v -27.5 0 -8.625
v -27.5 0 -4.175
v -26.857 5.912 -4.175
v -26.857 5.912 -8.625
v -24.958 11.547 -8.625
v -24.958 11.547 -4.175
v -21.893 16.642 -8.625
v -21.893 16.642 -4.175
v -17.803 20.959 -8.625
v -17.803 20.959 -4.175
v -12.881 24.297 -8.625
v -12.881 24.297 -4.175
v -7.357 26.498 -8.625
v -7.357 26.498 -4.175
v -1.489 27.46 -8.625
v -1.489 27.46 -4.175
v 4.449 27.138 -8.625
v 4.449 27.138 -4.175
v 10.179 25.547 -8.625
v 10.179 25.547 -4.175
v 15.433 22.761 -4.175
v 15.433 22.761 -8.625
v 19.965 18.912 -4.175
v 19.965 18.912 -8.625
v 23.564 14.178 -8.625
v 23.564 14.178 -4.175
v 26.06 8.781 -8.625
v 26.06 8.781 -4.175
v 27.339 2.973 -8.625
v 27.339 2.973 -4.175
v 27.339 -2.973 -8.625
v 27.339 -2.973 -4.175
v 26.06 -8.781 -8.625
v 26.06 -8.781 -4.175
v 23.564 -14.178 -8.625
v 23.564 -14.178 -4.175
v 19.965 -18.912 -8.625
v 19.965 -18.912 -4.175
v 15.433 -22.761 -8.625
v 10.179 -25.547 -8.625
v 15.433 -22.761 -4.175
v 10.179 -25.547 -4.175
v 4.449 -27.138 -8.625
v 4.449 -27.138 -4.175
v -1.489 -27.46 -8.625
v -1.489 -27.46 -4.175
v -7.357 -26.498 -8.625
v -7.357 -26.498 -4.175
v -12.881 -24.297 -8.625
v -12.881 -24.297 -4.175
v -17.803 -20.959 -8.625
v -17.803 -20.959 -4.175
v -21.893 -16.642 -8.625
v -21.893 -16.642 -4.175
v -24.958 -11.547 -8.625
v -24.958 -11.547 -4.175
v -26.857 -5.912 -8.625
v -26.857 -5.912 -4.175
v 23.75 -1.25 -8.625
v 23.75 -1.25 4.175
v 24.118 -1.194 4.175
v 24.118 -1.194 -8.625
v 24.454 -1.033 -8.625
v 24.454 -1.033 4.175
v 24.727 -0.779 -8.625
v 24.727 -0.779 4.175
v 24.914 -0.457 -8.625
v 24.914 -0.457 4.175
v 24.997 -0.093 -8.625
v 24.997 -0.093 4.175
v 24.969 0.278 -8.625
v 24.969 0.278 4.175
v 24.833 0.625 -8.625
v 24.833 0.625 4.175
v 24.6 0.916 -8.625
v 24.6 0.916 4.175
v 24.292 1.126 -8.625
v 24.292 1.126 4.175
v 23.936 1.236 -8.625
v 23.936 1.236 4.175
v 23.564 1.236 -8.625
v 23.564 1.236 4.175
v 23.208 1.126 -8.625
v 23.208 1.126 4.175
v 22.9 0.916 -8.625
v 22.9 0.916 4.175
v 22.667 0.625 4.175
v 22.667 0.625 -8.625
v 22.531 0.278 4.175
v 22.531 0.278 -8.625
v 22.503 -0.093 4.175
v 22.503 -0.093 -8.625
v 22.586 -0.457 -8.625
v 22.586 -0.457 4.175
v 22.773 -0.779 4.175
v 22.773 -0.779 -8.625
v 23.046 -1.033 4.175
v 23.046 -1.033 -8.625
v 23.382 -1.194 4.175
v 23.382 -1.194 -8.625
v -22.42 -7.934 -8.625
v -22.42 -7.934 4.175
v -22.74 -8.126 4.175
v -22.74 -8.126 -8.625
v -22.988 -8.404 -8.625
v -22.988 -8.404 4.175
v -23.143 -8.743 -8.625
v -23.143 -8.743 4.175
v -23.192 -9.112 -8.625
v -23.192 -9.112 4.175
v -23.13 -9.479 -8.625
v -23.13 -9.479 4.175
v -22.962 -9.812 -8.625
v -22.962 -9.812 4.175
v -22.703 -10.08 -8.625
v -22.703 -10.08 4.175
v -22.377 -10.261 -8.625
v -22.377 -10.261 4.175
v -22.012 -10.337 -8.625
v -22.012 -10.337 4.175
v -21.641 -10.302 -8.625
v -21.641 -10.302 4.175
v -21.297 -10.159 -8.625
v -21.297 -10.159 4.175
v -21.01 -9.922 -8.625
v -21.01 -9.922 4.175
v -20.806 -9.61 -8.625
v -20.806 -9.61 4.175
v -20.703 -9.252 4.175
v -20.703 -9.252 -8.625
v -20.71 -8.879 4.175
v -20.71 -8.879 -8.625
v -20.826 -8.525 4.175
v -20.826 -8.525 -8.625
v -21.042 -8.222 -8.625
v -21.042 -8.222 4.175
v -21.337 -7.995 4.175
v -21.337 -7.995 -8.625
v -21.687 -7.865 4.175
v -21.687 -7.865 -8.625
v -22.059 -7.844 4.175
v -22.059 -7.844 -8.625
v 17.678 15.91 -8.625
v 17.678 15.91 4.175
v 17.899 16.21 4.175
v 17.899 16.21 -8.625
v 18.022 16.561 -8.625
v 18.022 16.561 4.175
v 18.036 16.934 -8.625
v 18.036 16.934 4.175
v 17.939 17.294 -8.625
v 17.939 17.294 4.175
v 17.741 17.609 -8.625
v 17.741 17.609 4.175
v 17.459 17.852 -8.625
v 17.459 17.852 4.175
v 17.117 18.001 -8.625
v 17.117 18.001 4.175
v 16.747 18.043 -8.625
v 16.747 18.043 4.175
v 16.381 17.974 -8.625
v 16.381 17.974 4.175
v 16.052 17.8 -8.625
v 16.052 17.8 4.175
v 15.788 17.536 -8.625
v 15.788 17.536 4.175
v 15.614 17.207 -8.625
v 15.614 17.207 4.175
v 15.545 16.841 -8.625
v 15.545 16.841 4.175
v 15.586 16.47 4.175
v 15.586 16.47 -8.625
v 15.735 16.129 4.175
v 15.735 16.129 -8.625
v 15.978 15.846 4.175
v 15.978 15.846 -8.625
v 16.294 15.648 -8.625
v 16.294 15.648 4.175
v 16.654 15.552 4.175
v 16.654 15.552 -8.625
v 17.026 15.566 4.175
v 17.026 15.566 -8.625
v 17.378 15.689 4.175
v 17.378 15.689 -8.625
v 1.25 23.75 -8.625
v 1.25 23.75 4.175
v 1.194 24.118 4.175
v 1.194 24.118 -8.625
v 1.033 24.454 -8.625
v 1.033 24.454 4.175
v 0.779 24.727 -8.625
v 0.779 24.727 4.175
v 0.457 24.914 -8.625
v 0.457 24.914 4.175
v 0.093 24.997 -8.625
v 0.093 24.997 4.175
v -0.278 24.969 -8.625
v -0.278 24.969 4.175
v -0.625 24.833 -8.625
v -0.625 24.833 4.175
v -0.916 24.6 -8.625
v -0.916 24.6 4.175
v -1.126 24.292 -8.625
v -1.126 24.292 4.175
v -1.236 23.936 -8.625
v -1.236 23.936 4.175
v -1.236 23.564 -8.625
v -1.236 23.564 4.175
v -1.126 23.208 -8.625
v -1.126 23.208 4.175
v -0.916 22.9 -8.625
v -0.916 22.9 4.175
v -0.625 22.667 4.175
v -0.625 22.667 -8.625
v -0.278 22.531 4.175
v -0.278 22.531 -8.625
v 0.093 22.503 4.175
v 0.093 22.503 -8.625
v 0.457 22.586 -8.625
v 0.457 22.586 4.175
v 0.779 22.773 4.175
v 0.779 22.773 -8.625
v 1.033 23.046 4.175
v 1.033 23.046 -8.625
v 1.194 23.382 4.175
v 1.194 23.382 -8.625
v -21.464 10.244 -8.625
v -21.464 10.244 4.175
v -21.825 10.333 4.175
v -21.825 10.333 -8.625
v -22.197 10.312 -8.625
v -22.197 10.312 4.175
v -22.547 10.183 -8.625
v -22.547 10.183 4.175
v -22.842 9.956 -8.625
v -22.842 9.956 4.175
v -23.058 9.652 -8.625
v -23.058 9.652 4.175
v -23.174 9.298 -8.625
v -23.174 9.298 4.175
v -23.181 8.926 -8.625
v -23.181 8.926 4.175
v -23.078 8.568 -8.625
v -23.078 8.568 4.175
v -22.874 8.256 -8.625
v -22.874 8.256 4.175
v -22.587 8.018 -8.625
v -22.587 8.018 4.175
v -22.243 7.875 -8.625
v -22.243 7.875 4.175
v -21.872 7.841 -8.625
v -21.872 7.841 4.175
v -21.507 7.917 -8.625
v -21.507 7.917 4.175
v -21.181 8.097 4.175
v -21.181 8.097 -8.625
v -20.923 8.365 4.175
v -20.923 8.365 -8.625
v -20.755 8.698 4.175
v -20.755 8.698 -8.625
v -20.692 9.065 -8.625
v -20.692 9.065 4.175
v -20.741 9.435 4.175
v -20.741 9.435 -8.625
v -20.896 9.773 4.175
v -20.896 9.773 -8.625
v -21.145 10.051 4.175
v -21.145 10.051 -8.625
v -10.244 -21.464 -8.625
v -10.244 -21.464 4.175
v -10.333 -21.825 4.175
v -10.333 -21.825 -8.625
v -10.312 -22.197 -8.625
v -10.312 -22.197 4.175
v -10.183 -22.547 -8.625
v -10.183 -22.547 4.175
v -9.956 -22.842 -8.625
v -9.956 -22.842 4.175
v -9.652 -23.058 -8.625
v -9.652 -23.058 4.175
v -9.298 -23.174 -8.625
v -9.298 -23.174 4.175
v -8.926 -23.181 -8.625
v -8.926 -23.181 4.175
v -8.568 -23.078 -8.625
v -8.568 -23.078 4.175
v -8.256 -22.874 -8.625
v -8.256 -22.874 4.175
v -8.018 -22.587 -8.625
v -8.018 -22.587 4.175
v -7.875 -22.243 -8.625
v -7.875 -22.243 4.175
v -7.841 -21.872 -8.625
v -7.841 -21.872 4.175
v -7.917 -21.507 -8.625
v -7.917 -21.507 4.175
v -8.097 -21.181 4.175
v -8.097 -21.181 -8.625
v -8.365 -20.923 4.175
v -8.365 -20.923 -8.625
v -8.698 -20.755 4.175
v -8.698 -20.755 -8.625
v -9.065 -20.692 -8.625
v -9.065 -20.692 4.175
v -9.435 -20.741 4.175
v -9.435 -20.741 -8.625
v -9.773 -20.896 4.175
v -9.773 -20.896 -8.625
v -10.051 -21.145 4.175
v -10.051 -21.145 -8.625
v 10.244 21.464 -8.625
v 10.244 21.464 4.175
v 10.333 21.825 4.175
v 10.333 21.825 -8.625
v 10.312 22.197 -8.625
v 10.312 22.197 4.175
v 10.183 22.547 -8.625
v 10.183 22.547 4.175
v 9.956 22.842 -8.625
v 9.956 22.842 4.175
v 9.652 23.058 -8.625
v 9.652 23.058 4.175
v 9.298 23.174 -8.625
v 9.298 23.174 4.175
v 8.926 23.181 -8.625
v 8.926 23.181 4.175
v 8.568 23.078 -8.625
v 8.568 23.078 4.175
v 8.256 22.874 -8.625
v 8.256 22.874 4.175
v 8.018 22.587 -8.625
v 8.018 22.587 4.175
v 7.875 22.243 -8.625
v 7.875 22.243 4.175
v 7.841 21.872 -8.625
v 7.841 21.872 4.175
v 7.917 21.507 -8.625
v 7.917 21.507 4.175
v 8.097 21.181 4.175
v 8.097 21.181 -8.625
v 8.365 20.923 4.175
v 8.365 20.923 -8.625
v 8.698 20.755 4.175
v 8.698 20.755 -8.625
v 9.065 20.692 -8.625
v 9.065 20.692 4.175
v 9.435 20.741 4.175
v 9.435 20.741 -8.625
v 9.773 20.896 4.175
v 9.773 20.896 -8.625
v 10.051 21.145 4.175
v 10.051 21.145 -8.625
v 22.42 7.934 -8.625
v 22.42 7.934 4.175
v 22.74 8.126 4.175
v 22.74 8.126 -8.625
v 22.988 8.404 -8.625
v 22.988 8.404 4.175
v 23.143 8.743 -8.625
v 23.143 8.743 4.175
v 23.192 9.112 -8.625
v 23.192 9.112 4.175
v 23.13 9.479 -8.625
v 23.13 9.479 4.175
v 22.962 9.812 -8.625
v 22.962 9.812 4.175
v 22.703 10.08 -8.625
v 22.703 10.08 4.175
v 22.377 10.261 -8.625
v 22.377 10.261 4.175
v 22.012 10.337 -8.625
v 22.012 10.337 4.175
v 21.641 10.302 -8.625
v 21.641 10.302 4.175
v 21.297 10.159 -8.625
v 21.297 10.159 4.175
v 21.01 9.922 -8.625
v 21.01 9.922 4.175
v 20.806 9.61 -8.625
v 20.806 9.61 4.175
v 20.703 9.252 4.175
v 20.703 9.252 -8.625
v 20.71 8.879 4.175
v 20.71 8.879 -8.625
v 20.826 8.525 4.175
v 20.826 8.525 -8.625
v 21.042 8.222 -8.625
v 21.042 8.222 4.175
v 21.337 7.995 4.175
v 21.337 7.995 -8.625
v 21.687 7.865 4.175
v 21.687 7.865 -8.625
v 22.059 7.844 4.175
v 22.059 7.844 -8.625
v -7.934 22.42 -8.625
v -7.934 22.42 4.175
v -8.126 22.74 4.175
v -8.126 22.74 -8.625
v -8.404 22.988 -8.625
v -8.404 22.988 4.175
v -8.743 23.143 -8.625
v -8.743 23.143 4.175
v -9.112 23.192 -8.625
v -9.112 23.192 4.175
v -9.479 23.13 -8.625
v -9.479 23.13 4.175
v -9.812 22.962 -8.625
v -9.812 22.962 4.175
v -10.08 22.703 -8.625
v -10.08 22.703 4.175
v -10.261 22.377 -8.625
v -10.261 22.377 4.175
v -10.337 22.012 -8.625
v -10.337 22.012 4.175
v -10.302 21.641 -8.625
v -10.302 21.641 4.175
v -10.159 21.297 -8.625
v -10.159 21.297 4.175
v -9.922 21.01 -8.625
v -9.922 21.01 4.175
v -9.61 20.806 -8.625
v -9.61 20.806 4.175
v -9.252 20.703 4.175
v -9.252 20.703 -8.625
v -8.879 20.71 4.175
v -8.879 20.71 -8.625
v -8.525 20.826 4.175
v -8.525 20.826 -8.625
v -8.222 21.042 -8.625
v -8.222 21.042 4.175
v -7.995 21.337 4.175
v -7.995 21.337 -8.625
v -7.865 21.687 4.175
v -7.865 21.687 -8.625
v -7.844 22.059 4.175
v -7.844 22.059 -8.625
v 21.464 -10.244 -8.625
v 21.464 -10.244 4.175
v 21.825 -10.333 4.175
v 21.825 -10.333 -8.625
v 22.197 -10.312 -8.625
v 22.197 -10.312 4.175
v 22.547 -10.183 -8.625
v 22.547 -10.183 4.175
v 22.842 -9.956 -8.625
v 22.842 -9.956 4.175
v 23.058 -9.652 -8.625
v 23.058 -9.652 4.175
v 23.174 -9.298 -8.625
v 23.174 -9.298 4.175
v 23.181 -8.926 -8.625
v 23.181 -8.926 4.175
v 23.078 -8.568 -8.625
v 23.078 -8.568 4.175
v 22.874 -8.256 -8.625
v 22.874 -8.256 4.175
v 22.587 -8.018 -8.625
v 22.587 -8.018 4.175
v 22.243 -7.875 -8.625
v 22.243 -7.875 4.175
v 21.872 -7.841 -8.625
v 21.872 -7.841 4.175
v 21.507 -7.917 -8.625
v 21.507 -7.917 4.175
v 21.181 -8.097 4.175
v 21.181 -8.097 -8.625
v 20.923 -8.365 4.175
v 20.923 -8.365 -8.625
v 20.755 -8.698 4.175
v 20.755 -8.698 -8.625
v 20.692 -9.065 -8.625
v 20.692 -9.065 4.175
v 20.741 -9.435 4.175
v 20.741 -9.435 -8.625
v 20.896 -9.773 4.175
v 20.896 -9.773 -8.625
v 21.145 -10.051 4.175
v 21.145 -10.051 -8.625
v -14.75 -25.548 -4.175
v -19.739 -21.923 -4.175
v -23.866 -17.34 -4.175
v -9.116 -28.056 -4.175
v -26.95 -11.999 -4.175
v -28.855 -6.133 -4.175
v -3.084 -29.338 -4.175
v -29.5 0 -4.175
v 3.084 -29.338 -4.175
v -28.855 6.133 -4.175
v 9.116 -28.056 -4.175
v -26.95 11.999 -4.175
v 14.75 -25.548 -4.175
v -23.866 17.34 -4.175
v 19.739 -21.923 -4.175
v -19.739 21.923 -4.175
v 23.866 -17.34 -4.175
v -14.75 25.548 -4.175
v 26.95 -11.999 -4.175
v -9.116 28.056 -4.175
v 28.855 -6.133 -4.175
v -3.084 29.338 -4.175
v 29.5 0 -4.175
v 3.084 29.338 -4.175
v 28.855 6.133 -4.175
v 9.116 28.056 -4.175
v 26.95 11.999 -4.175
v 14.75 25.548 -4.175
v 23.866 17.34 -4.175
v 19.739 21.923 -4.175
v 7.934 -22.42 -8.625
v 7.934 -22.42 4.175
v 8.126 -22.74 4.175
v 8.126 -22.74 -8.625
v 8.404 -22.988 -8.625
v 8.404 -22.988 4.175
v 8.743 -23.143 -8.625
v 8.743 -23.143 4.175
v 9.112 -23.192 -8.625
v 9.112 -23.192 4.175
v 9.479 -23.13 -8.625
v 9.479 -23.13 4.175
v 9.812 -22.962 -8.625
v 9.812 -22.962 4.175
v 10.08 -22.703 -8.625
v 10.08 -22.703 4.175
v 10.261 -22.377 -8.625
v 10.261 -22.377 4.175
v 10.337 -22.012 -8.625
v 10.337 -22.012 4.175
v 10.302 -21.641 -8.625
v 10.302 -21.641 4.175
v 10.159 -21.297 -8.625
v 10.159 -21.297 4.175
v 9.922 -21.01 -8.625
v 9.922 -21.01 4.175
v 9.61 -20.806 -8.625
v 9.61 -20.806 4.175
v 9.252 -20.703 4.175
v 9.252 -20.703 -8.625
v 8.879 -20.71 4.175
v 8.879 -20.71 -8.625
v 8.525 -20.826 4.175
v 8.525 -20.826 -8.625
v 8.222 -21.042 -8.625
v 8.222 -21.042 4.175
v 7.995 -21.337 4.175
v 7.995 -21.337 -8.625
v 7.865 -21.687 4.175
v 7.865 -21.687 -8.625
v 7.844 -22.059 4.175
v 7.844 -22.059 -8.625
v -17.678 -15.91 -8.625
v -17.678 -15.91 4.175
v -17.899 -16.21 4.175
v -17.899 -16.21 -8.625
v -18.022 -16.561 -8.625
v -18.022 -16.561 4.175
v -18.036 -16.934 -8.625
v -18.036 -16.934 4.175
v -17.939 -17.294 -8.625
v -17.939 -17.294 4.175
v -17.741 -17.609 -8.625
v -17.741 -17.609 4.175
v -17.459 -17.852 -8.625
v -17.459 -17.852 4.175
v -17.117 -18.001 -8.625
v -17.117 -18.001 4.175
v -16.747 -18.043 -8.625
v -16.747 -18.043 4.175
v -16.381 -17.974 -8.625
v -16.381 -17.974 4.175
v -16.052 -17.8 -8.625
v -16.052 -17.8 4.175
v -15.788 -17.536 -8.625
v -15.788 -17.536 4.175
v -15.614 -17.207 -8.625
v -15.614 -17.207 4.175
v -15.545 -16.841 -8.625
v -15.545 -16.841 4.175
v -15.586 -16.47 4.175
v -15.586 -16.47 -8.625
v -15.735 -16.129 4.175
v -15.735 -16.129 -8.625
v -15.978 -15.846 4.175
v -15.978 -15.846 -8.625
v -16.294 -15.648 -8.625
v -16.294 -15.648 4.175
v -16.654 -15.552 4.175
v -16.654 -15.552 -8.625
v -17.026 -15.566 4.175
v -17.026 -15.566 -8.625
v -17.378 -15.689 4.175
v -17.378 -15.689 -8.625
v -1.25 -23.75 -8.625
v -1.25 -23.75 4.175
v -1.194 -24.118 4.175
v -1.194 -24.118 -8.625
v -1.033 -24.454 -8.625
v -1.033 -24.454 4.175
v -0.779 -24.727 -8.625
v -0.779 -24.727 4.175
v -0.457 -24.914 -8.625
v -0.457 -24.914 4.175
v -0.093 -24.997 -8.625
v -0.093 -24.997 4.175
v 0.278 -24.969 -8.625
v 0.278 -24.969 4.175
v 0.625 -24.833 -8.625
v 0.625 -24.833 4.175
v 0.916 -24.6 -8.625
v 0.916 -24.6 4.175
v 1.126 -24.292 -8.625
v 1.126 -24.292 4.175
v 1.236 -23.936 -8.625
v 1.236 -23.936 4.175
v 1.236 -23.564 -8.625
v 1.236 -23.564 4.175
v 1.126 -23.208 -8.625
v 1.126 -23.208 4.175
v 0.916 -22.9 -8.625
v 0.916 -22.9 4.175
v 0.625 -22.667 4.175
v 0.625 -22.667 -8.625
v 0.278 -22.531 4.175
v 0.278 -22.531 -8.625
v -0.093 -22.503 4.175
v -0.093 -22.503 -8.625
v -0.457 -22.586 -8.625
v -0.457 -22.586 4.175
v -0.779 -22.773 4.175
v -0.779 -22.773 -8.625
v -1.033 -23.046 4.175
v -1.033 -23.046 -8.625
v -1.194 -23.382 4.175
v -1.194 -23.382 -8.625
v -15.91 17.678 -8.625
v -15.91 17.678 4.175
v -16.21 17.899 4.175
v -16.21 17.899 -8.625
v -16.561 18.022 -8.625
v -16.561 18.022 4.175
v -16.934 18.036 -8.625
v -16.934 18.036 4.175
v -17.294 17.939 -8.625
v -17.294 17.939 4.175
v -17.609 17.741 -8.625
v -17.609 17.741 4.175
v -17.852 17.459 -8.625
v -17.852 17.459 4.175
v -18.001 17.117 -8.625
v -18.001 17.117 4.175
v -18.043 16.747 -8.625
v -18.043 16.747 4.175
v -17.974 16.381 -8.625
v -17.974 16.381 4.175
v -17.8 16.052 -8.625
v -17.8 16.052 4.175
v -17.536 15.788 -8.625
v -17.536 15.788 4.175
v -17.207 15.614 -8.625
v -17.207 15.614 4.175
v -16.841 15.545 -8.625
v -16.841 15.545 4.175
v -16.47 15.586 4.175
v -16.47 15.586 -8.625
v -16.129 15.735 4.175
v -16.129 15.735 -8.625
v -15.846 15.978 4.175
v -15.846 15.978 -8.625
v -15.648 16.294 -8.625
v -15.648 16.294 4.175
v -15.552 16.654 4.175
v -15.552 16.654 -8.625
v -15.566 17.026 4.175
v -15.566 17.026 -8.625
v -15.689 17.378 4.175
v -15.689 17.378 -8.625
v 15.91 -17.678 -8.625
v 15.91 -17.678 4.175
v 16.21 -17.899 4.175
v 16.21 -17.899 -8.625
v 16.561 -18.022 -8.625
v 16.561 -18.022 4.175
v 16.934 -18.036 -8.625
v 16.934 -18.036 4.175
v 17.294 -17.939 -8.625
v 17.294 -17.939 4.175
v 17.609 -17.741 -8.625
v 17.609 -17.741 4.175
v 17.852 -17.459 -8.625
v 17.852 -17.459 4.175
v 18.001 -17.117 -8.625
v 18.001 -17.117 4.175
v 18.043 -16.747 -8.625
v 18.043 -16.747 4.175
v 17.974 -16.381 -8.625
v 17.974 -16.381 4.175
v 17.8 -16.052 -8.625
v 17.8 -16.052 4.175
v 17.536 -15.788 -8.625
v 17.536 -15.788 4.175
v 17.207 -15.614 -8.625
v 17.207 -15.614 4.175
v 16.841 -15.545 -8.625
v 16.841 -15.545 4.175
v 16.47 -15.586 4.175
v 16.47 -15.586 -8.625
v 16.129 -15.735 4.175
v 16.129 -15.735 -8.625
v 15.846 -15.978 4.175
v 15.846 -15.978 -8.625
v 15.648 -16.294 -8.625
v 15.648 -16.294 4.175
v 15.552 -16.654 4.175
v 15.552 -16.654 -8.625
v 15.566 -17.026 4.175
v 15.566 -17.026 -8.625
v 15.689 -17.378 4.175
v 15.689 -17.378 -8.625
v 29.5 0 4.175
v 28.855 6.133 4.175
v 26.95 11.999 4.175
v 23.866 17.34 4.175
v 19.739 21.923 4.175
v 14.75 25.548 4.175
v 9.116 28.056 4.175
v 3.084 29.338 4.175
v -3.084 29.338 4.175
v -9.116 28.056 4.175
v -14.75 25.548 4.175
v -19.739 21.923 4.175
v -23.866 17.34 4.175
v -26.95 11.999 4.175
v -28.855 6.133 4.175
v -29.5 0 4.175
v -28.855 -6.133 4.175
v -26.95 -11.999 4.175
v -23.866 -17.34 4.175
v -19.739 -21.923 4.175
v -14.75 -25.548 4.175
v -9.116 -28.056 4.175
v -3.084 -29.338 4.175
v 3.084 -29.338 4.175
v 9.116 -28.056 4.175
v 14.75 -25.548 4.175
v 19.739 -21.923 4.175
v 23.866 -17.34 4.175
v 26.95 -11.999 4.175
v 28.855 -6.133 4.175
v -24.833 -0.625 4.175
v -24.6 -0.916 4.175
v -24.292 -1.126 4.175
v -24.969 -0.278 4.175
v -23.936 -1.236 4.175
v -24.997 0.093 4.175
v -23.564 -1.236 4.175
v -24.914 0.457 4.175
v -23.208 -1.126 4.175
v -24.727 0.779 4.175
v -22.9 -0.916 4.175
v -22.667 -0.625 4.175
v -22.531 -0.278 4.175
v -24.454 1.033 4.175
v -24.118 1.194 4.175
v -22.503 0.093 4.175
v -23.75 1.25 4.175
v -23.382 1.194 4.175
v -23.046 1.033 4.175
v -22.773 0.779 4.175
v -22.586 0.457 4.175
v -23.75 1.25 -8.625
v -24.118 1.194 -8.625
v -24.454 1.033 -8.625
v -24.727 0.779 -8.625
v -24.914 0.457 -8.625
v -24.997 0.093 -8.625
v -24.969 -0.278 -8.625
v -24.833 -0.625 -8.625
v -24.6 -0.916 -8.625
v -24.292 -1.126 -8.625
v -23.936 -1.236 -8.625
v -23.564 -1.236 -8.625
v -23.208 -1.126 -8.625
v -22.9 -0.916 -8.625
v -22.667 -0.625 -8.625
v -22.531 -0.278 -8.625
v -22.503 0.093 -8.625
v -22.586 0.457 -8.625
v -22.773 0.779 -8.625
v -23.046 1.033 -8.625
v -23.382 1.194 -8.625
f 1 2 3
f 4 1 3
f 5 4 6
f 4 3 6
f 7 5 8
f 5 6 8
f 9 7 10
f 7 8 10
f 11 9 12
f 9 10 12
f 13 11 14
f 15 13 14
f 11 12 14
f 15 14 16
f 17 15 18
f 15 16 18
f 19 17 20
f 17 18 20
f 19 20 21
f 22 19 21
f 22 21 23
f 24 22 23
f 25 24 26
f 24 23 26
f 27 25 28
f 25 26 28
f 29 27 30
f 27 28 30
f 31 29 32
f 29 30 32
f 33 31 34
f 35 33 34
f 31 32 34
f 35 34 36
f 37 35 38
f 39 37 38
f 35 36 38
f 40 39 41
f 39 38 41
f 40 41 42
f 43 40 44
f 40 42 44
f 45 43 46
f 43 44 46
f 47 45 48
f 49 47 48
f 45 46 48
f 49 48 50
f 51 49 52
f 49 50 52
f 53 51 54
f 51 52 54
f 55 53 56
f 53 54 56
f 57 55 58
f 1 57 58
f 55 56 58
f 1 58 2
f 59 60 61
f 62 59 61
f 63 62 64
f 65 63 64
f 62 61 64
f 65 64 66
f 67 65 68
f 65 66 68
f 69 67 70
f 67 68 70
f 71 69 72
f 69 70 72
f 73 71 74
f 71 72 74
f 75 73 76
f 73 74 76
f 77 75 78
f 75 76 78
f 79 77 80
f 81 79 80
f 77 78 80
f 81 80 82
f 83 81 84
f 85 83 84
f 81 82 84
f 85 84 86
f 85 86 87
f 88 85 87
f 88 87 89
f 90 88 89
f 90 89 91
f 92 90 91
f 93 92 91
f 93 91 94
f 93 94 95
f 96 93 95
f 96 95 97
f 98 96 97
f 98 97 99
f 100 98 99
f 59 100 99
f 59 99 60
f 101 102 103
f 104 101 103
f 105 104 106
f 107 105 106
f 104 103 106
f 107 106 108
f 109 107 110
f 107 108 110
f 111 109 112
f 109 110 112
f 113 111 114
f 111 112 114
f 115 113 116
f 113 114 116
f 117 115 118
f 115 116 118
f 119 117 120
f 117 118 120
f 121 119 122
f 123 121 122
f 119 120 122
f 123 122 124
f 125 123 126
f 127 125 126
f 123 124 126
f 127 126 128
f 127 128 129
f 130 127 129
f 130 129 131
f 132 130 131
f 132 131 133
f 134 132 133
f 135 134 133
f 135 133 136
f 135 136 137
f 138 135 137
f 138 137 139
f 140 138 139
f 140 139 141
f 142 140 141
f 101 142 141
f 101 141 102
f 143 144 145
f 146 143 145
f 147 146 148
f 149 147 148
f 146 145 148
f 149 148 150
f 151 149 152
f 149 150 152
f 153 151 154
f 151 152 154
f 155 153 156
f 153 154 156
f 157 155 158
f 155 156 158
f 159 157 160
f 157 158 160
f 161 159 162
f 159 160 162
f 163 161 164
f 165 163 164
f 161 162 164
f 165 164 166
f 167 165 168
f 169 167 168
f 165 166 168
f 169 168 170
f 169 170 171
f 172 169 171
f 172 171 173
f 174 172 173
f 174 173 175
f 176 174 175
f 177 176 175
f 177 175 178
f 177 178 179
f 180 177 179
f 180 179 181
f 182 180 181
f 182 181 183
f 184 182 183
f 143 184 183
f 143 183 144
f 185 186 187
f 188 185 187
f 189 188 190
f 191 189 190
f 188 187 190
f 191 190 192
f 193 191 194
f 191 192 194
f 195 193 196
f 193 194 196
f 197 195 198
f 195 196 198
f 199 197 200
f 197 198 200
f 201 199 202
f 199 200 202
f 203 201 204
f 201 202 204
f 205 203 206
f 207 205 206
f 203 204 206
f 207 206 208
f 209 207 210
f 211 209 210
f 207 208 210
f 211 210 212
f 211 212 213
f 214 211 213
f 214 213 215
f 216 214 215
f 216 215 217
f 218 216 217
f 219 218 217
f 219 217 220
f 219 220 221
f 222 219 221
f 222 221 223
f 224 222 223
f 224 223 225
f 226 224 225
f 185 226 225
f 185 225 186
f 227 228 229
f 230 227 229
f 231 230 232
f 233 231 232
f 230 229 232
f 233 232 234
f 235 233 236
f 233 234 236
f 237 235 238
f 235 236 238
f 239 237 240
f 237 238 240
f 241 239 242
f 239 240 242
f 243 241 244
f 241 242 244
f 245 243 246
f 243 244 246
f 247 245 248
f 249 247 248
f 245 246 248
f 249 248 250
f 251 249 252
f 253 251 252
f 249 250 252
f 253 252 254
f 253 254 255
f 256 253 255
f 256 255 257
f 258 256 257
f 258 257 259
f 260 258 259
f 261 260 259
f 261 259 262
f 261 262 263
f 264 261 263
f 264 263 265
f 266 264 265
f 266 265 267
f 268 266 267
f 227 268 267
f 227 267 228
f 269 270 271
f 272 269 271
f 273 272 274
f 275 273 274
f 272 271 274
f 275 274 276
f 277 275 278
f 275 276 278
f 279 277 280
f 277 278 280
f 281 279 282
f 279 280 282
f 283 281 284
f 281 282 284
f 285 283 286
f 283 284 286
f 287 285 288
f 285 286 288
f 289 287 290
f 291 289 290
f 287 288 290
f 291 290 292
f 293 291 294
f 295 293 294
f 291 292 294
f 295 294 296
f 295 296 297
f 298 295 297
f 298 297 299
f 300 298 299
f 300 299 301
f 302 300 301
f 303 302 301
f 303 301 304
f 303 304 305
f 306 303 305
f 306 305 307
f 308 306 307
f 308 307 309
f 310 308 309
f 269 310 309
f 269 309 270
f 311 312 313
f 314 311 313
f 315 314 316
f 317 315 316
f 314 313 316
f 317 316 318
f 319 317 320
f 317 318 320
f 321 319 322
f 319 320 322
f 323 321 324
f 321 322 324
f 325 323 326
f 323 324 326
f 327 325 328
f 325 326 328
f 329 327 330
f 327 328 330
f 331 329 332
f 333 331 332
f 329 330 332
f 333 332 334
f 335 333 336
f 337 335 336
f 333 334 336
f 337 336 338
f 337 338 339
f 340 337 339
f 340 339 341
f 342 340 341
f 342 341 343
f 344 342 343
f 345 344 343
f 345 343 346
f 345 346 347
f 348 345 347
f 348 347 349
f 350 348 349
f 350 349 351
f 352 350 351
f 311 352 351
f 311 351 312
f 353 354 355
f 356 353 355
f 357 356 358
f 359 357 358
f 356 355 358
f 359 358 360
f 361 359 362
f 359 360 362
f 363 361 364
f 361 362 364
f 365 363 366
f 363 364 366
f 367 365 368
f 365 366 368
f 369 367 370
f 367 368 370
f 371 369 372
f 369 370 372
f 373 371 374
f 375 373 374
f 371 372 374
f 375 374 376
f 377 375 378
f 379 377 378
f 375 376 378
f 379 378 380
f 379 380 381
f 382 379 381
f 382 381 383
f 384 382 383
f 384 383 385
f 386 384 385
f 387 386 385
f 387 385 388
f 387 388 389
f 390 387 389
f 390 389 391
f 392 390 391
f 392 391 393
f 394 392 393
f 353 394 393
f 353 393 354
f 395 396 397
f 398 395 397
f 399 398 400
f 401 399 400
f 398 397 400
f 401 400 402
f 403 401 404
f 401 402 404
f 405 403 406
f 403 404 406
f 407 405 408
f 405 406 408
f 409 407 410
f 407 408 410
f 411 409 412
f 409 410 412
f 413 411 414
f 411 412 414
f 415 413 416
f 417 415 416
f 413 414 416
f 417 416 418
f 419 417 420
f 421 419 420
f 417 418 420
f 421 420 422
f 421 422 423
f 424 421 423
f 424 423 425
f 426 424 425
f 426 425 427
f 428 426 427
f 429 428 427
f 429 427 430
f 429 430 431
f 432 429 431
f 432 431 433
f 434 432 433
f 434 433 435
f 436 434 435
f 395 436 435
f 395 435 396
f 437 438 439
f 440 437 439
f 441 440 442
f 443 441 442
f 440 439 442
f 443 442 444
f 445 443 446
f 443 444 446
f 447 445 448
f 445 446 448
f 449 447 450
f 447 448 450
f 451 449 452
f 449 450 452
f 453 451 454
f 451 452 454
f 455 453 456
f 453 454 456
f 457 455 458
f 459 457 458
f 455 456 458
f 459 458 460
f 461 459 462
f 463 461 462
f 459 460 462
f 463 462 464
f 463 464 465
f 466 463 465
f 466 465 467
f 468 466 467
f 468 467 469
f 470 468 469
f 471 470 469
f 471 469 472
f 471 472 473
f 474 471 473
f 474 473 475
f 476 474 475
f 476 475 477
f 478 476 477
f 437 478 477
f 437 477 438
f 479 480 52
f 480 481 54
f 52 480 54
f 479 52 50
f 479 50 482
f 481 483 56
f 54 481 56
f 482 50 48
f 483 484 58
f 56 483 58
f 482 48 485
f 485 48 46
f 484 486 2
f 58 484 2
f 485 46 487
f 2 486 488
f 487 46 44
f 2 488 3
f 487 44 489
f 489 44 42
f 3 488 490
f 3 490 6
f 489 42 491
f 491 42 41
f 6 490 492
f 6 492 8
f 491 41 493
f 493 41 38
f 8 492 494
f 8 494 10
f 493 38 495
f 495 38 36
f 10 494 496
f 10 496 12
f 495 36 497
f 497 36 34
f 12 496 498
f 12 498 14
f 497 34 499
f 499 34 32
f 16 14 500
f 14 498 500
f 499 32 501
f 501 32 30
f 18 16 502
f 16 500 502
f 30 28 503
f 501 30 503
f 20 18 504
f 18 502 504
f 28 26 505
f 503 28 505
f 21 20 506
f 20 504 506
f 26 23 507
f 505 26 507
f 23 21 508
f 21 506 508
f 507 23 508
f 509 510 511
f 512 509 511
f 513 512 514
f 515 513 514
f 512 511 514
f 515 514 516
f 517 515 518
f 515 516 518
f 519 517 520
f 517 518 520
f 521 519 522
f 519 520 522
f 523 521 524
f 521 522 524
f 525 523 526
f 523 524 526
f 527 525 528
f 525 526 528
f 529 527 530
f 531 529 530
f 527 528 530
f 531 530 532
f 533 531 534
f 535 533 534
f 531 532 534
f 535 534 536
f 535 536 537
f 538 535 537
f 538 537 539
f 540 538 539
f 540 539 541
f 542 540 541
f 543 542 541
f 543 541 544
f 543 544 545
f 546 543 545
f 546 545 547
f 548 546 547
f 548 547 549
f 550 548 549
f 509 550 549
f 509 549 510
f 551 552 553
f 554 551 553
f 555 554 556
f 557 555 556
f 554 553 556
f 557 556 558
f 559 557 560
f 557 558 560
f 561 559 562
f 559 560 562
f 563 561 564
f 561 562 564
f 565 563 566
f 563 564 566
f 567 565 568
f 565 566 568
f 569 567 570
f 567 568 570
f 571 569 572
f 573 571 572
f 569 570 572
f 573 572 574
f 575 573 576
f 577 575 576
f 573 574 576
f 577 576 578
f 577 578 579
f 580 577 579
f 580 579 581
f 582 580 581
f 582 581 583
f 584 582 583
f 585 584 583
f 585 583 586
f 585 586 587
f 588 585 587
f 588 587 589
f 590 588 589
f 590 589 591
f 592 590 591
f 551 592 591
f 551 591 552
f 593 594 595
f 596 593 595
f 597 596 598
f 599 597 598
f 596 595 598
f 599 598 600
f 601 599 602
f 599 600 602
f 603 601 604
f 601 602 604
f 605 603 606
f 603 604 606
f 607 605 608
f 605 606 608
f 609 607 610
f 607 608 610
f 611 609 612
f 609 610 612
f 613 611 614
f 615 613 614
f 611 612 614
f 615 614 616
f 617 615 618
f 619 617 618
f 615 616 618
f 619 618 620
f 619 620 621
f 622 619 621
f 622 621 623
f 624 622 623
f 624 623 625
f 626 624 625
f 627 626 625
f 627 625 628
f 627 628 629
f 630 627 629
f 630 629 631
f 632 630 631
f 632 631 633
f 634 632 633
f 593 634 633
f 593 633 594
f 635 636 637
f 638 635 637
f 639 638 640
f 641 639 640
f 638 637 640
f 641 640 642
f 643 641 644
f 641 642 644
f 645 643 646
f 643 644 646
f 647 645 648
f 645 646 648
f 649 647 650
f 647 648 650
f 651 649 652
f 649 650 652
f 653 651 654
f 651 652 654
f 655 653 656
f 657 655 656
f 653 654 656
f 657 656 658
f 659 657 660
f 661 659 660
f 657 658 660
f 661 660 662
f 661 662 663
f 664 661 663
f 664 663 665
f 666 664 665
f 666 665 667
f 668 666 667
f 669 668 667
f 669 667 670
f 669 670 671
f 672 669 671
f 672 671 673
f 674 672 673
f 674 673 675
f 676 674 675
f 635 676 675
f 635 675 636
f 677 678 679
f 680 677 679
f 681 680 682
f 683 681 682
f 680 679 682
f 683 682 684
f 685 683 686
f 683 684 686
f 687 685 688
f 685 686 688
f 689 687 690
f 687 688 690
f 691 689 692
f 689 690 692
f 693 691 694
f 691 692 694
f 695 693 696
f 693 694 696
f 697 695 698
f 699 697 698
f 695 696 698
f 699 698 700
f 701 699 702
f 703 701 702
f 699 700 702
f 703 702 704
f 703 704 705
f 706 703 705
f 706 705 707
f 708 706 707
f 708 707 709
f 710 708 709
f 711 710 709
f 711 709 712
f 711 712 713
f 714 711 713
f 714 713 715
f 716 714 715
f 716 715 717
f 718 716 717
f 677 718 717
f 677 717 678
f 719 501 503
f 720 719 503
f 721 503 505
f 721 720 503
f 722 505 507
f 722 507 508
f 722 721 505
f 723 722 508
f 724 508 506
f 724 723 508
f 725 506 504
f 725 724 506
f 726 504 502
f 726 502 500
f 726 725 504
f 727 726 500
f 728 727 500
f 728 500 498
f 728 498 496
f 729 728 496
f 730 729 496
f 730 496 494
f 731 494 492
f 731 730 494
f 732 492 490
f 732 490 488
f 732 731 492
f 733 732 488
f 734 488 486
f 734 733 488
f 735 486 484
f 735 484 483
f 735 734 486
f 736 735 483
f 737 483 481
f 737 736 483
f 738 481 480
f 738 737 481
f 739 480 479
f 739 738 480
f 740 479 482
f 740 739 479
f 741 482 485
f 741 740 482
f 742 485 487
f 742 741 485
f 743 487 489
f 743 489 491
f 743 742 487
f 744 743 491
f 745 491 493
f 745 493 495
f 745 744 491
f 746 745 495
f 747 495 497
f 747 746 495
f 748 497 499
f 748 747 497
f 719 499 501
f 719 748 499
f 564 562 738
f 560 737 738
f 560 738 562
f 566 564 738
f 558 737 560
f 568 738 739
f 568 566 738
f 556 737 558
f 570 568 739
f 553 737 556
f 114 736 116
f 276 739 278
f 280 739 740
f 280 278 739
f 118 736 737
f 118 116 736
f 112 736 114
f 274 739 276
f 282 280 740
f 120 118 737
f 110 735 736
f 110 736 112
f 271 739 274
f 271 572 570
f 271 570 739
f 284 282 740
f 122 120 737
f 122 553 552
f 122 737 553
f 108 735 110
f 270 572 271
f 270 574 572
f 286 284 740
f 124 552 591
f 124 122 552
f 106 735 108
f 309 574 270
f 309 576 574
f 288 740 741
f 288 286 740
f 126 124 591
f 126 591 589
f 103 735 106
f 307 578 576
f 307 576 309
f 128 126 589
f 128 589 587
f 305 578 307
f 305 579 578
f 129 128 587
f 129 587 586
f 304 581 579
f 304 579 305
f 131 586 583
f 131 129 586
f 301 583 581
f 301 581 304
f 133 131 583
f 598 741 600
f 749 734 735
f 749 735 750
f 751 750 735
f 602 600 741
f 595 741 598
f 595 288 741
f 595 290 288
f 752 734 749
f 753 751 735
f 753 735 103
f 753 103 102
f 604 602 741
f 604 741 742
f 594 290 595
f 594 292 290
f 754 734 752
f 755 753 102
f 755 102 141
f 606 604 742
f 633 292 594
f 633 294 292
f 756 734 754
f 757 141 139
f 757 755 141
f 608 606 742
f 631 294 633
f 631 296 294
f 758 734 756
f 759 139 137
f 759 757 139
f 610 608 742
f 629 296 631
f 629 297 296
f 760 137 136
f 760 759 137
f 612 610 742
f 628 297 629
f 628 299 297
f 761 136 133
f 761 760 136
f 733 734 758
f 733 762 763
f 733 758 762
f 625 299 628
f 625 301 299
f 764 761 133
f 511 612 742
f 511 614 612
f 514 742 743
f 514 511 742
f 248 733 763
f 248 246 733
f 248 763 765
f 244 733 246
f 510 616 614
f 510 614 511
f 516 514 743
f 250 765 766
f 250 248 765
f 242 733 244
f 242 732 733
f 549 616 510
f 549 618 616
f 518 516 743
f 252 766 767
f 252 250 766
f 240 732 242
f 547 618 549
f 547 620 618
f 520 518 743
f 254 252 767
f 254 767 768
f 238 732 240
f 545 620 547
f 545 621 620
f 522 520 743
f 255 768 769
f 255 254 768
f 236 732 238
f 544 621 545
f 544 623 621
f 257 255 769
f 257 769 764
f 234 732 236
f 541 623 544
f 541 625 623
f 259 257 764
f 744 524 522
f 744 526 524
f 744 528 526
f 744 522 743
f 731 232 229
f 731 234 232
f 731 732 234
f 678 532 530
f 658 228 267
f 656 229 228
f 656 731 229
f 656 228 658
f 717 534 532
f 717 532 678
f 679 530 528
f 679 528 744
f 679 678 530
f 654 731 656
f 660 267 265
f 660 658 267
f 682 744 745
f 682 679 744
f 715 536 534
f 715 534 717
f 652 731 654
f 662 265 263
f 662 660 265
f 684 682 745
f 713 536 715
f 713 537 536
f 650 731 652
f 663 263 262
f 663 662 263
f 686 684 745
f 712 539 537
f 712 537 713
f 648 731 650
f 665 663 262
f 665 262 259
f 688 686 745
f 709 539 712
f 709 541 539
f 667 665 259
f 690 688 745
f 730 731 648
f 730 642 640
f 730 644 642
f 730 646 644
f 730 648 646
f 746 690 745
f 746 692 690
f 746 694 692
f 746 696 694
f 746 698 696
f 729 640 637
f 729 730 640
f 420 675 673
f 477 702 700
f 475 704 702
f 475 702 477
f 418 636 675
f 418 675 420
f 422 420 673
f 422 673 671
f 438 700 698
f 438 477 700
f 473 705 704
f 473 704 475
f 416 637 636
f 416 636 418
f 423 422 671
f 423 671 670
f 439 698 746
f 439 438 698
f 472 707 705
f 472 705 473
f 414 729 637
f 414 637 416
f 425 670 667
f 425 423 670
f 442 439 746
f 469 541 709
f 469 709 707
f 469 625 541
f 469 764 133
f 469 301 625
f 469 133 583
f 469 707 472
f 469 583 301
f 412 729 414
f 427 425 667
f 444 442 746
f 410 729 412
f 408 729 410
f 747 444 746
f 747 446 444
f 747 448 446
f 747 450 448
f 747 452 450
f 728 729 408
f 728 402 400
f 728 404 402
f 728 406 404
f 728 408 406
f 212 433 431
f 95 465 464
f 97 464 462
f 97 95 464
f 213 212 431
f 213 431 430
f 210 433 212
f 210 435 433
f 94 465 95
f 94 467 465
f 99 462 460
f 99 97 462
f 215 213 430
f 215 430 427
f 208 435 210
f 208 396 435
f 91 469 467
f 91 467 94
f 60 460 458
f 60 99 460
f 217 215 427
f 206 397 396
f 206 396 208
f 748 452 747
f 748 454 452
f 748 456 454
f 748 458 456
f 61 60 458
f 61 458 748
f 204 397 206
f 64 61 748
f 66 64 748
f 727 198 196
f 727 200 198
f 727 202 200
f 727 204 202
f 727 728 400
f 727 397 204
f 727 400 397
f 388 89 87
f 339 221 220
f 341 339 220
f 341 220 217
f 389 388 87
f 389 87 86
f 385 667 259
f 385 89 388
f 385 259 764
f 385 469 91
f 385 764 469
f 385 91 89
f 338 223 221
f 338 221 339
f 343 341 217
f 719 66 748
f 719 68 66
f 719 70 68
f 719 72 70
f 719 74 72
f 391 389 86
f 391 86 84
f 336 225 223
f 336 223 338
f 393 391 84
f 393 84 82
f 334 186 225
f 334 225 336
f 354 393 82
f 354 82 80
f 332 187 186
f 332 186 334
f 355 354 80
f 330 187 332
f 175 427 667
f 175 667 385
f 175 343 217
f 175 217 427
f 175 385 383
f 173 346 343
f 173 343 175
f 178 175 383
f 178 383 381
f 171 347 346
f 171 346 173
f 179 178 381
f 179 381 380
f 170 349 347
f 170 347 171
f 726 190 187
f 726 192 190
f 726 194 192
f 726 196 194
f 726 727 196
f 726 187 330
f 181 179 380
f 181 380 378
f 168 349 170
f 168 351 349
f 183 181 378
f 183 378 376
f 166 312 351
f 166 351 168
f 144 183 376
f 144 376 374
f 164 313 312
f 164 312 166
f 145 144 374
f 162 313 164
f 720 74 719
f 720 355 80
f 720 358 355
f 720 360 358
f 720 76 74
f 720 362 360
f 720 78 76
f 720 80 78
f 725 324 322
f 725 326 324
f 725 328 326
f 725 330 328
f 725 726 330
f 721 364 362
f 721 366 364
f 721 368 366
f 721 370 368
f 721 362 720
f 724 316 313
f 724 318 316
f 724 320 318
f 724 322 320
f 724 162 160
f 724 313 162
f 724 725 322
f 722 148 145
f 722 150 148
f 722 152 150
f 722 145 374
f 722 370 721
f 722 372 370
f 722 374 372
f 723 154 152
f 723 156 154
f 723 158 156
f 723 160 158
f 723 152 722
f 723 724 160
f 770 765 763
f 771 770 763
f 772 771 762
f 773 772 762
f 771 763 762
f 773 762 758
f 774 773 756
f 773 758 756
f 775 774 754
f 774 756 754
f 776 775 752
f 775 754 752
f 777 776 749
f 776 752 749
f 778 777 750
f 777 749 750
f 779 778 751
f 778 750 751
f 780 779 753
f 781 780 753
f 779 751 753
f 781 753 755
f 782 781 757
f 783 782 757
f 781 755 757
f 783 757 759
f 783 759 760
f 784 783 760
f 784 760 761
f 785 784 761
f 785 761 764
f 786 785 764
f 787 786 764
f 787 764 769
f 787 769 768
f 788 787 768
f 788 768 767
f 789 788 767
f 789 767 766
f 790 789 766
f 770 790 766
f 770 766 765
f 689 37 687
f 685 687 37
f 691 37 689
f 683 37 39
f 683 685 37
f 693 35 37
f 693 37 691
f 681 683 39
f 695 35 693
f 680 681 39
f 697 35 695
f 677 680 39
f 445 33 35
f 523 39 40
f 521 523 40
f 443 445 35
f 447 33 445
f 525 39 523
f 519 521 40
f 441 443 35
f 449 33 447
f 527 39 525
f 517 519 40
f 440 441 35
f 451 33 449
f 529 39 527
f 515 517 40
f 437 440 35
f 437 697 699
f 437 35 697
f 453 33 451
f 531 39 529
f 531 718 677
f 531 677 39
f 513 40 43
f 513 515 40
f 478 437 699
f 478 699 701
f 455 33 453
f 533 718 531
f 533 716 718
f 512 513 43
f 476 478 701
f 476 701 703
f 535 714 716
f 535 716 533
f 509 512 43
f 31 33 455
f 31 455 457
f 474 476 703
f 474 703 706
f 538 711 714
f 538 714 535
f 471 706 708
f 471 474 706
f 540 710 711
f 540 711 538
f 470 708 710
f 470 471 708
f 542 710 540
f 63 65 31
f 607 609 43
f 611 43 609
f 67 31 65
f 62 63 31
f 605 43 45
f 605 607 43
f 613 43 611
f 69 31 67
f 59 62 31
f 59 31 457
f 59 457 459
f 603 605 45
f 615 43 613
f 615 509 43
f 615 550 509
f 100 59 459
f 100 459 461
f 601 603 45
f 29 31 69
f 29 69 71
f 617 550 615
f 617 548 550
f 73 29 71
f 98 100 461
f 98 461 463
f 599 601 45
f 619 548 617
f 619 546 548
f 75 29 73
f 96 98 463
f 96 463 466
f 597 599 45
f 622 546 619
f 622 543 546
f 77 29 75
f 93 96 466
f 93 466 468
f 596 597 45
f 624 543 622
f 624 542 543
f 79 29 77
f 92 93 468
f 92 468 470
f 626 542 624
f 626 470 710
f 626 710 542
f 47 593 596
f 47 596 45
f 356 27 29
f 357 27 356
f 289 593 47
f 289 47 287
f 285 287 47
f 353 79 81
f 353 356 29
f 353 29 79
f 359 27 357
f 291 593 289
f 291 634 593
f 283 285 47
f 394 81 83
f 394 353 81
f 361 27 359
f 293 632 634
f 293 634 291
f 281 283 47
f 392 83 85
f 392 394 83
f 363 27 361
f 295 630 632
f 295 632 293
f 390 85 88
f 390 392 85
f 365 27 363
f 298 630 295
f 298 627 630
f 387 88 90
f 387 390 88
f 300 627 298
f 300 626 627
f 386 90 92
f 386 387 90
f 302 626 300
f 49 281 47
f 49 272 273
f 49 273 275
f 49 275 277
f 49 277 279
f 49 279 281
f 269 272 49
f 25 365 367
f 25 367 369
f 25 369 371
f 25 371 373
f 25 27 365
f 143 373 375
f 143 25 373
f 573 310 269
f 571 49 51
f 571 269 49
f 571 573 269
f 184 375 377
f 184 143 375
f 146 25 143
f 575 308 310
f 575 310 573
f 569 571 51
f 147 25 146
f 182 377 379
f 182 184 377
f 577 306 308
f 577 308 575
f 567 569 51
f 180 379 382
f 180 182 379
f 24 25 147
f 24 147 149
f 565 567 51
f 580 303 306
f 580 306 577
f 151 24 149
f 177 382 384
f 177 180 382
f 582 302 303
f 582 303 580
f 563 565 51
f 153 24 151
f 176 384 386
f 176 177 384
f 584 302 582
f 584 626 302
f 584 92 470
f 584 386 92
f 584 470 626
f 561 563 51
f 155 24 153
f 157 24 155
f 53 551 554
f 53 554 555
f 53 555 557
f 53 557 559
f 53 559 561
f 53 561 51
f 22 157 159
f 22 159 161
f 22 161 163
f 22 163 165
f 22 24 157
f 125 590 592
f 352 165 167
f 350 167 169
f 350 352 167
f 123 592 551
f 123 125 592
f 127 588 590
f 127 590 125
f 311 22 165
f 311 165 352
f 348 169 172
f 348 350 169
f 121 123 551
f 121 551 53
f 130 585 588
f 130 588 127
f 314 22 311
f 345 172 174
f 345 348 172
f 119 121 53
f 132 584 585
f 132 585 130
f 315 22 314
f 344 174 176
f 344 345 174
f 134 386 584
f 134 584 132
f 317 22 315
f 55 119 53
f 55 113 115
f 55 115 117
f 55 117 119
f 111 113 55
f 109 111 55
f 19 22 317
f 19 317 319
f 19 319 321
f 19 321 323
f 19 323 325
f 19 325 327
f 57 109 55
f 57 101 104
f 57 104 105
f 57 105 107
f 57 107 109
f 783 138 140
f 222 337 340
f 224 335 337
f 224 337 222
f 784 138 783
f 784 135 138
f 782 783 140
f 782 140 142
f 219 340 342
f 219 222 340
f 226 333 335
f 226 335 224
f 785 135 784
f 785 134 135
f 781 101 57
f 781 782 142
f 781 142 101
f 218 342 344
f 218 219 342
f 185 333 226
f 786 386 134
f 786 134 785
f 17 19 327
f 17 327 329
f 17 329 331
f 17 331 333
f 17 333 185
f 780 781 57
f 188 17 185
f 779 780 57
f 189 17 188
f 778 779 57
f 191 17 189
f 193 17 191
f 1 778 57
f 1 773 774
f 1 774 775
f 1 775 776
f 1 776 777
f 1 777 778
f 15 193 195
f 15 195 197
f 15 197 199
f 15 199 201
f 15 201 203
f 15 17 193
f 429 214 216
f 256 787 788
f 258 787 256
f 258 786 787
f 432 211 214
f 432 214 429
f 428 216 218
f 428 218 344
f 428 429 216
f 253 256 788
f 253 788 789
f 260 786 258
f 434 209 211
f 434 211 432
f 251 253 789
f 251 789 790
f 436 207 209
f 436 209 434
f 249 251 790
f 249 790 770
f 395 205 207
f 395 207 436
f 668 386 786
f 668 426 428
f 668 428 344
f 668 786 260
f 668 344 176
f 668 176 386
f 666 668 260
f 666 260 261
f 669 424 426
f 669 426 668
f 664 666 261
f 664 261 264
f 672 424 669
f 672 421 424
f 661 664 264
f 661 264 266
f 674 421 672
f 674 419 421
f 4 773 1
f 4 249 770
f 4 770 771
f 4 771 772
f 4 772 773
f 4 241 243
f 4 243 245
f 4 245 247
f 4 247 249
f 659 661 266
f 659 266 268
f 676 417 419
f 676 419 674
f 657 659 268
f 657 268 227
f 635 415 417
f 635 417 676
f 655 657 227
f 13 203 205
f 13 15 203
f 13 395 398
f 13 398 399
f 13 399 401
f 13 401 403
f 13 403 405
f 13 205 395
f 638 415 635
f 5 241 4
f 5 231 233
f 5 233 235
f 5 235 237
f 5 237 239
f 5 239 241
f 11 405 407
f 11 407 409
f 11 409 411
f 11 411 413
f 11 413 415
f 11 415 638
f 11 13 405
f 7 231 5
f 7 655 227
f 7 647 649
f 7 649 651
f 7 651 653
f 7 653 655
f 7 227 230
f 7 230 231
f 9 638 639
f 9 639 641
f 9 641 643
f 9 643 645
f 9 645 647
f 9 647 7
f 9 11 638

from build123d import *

# Parameters (mm, degrees)
SKETCH1_R           = 29.5
BOSS_EXTRUDE1_DEPTH = 4.175
SKETCH2_R           = 27.5
BOSS_EXTRUDE2_DEPTH = 4.45
SKETCH3_R           = 1.25
CUT_EXTRUDE1_DEPTH  = 44.638744253
CIRPATTERN1_COUNT   = 16


with BuildPart() as part:
    # Sketch1 → Boss-Extrude1 (new, symmetric)
    with BuildSketch(Plane.XY):
        Circle(SKETCH1_R)
    extrude(amount=BOSS_EXTRUDE1_DEPTH, both=True)

    # Sketch2 → Boss-Extrude2 (add)
    with BuildSketch(Plane(origin=(0, 0, -4.175), x_dir=(-1, 0, 0), z_dir=(0, 0, -1))):
        Circle(SKETCH2_R)
    extrude(amount=BOSS_EXTRUDE2_DEPTH)

    # Sketch3 → Cut-Extrude1 (cut, through all)
    with BuildSketch(Plane.XY.offset(4.175)):
        with Locations((0, 23.75)):
            Circle(SKETCH3_R)
    cut_extrude1 = extrude(amount=-CUT_EXTRUDE1_DEPTH, mode=Mode.SUBTRACT)

    # CirPattern1: Cut-Extrude1 ×16 about axis
    cirpattern1_axis = Axis((0, 0, 0), (0, 0, 1))
    for i in range(1, CIRPATTERN1_COUNT):
        add(cut_extrude1.rotate(cirpattern1_axis, i * 360 / CIRPATTERN1_COUNT), mode=Mode.SUBTRACT)


solid = part.part
